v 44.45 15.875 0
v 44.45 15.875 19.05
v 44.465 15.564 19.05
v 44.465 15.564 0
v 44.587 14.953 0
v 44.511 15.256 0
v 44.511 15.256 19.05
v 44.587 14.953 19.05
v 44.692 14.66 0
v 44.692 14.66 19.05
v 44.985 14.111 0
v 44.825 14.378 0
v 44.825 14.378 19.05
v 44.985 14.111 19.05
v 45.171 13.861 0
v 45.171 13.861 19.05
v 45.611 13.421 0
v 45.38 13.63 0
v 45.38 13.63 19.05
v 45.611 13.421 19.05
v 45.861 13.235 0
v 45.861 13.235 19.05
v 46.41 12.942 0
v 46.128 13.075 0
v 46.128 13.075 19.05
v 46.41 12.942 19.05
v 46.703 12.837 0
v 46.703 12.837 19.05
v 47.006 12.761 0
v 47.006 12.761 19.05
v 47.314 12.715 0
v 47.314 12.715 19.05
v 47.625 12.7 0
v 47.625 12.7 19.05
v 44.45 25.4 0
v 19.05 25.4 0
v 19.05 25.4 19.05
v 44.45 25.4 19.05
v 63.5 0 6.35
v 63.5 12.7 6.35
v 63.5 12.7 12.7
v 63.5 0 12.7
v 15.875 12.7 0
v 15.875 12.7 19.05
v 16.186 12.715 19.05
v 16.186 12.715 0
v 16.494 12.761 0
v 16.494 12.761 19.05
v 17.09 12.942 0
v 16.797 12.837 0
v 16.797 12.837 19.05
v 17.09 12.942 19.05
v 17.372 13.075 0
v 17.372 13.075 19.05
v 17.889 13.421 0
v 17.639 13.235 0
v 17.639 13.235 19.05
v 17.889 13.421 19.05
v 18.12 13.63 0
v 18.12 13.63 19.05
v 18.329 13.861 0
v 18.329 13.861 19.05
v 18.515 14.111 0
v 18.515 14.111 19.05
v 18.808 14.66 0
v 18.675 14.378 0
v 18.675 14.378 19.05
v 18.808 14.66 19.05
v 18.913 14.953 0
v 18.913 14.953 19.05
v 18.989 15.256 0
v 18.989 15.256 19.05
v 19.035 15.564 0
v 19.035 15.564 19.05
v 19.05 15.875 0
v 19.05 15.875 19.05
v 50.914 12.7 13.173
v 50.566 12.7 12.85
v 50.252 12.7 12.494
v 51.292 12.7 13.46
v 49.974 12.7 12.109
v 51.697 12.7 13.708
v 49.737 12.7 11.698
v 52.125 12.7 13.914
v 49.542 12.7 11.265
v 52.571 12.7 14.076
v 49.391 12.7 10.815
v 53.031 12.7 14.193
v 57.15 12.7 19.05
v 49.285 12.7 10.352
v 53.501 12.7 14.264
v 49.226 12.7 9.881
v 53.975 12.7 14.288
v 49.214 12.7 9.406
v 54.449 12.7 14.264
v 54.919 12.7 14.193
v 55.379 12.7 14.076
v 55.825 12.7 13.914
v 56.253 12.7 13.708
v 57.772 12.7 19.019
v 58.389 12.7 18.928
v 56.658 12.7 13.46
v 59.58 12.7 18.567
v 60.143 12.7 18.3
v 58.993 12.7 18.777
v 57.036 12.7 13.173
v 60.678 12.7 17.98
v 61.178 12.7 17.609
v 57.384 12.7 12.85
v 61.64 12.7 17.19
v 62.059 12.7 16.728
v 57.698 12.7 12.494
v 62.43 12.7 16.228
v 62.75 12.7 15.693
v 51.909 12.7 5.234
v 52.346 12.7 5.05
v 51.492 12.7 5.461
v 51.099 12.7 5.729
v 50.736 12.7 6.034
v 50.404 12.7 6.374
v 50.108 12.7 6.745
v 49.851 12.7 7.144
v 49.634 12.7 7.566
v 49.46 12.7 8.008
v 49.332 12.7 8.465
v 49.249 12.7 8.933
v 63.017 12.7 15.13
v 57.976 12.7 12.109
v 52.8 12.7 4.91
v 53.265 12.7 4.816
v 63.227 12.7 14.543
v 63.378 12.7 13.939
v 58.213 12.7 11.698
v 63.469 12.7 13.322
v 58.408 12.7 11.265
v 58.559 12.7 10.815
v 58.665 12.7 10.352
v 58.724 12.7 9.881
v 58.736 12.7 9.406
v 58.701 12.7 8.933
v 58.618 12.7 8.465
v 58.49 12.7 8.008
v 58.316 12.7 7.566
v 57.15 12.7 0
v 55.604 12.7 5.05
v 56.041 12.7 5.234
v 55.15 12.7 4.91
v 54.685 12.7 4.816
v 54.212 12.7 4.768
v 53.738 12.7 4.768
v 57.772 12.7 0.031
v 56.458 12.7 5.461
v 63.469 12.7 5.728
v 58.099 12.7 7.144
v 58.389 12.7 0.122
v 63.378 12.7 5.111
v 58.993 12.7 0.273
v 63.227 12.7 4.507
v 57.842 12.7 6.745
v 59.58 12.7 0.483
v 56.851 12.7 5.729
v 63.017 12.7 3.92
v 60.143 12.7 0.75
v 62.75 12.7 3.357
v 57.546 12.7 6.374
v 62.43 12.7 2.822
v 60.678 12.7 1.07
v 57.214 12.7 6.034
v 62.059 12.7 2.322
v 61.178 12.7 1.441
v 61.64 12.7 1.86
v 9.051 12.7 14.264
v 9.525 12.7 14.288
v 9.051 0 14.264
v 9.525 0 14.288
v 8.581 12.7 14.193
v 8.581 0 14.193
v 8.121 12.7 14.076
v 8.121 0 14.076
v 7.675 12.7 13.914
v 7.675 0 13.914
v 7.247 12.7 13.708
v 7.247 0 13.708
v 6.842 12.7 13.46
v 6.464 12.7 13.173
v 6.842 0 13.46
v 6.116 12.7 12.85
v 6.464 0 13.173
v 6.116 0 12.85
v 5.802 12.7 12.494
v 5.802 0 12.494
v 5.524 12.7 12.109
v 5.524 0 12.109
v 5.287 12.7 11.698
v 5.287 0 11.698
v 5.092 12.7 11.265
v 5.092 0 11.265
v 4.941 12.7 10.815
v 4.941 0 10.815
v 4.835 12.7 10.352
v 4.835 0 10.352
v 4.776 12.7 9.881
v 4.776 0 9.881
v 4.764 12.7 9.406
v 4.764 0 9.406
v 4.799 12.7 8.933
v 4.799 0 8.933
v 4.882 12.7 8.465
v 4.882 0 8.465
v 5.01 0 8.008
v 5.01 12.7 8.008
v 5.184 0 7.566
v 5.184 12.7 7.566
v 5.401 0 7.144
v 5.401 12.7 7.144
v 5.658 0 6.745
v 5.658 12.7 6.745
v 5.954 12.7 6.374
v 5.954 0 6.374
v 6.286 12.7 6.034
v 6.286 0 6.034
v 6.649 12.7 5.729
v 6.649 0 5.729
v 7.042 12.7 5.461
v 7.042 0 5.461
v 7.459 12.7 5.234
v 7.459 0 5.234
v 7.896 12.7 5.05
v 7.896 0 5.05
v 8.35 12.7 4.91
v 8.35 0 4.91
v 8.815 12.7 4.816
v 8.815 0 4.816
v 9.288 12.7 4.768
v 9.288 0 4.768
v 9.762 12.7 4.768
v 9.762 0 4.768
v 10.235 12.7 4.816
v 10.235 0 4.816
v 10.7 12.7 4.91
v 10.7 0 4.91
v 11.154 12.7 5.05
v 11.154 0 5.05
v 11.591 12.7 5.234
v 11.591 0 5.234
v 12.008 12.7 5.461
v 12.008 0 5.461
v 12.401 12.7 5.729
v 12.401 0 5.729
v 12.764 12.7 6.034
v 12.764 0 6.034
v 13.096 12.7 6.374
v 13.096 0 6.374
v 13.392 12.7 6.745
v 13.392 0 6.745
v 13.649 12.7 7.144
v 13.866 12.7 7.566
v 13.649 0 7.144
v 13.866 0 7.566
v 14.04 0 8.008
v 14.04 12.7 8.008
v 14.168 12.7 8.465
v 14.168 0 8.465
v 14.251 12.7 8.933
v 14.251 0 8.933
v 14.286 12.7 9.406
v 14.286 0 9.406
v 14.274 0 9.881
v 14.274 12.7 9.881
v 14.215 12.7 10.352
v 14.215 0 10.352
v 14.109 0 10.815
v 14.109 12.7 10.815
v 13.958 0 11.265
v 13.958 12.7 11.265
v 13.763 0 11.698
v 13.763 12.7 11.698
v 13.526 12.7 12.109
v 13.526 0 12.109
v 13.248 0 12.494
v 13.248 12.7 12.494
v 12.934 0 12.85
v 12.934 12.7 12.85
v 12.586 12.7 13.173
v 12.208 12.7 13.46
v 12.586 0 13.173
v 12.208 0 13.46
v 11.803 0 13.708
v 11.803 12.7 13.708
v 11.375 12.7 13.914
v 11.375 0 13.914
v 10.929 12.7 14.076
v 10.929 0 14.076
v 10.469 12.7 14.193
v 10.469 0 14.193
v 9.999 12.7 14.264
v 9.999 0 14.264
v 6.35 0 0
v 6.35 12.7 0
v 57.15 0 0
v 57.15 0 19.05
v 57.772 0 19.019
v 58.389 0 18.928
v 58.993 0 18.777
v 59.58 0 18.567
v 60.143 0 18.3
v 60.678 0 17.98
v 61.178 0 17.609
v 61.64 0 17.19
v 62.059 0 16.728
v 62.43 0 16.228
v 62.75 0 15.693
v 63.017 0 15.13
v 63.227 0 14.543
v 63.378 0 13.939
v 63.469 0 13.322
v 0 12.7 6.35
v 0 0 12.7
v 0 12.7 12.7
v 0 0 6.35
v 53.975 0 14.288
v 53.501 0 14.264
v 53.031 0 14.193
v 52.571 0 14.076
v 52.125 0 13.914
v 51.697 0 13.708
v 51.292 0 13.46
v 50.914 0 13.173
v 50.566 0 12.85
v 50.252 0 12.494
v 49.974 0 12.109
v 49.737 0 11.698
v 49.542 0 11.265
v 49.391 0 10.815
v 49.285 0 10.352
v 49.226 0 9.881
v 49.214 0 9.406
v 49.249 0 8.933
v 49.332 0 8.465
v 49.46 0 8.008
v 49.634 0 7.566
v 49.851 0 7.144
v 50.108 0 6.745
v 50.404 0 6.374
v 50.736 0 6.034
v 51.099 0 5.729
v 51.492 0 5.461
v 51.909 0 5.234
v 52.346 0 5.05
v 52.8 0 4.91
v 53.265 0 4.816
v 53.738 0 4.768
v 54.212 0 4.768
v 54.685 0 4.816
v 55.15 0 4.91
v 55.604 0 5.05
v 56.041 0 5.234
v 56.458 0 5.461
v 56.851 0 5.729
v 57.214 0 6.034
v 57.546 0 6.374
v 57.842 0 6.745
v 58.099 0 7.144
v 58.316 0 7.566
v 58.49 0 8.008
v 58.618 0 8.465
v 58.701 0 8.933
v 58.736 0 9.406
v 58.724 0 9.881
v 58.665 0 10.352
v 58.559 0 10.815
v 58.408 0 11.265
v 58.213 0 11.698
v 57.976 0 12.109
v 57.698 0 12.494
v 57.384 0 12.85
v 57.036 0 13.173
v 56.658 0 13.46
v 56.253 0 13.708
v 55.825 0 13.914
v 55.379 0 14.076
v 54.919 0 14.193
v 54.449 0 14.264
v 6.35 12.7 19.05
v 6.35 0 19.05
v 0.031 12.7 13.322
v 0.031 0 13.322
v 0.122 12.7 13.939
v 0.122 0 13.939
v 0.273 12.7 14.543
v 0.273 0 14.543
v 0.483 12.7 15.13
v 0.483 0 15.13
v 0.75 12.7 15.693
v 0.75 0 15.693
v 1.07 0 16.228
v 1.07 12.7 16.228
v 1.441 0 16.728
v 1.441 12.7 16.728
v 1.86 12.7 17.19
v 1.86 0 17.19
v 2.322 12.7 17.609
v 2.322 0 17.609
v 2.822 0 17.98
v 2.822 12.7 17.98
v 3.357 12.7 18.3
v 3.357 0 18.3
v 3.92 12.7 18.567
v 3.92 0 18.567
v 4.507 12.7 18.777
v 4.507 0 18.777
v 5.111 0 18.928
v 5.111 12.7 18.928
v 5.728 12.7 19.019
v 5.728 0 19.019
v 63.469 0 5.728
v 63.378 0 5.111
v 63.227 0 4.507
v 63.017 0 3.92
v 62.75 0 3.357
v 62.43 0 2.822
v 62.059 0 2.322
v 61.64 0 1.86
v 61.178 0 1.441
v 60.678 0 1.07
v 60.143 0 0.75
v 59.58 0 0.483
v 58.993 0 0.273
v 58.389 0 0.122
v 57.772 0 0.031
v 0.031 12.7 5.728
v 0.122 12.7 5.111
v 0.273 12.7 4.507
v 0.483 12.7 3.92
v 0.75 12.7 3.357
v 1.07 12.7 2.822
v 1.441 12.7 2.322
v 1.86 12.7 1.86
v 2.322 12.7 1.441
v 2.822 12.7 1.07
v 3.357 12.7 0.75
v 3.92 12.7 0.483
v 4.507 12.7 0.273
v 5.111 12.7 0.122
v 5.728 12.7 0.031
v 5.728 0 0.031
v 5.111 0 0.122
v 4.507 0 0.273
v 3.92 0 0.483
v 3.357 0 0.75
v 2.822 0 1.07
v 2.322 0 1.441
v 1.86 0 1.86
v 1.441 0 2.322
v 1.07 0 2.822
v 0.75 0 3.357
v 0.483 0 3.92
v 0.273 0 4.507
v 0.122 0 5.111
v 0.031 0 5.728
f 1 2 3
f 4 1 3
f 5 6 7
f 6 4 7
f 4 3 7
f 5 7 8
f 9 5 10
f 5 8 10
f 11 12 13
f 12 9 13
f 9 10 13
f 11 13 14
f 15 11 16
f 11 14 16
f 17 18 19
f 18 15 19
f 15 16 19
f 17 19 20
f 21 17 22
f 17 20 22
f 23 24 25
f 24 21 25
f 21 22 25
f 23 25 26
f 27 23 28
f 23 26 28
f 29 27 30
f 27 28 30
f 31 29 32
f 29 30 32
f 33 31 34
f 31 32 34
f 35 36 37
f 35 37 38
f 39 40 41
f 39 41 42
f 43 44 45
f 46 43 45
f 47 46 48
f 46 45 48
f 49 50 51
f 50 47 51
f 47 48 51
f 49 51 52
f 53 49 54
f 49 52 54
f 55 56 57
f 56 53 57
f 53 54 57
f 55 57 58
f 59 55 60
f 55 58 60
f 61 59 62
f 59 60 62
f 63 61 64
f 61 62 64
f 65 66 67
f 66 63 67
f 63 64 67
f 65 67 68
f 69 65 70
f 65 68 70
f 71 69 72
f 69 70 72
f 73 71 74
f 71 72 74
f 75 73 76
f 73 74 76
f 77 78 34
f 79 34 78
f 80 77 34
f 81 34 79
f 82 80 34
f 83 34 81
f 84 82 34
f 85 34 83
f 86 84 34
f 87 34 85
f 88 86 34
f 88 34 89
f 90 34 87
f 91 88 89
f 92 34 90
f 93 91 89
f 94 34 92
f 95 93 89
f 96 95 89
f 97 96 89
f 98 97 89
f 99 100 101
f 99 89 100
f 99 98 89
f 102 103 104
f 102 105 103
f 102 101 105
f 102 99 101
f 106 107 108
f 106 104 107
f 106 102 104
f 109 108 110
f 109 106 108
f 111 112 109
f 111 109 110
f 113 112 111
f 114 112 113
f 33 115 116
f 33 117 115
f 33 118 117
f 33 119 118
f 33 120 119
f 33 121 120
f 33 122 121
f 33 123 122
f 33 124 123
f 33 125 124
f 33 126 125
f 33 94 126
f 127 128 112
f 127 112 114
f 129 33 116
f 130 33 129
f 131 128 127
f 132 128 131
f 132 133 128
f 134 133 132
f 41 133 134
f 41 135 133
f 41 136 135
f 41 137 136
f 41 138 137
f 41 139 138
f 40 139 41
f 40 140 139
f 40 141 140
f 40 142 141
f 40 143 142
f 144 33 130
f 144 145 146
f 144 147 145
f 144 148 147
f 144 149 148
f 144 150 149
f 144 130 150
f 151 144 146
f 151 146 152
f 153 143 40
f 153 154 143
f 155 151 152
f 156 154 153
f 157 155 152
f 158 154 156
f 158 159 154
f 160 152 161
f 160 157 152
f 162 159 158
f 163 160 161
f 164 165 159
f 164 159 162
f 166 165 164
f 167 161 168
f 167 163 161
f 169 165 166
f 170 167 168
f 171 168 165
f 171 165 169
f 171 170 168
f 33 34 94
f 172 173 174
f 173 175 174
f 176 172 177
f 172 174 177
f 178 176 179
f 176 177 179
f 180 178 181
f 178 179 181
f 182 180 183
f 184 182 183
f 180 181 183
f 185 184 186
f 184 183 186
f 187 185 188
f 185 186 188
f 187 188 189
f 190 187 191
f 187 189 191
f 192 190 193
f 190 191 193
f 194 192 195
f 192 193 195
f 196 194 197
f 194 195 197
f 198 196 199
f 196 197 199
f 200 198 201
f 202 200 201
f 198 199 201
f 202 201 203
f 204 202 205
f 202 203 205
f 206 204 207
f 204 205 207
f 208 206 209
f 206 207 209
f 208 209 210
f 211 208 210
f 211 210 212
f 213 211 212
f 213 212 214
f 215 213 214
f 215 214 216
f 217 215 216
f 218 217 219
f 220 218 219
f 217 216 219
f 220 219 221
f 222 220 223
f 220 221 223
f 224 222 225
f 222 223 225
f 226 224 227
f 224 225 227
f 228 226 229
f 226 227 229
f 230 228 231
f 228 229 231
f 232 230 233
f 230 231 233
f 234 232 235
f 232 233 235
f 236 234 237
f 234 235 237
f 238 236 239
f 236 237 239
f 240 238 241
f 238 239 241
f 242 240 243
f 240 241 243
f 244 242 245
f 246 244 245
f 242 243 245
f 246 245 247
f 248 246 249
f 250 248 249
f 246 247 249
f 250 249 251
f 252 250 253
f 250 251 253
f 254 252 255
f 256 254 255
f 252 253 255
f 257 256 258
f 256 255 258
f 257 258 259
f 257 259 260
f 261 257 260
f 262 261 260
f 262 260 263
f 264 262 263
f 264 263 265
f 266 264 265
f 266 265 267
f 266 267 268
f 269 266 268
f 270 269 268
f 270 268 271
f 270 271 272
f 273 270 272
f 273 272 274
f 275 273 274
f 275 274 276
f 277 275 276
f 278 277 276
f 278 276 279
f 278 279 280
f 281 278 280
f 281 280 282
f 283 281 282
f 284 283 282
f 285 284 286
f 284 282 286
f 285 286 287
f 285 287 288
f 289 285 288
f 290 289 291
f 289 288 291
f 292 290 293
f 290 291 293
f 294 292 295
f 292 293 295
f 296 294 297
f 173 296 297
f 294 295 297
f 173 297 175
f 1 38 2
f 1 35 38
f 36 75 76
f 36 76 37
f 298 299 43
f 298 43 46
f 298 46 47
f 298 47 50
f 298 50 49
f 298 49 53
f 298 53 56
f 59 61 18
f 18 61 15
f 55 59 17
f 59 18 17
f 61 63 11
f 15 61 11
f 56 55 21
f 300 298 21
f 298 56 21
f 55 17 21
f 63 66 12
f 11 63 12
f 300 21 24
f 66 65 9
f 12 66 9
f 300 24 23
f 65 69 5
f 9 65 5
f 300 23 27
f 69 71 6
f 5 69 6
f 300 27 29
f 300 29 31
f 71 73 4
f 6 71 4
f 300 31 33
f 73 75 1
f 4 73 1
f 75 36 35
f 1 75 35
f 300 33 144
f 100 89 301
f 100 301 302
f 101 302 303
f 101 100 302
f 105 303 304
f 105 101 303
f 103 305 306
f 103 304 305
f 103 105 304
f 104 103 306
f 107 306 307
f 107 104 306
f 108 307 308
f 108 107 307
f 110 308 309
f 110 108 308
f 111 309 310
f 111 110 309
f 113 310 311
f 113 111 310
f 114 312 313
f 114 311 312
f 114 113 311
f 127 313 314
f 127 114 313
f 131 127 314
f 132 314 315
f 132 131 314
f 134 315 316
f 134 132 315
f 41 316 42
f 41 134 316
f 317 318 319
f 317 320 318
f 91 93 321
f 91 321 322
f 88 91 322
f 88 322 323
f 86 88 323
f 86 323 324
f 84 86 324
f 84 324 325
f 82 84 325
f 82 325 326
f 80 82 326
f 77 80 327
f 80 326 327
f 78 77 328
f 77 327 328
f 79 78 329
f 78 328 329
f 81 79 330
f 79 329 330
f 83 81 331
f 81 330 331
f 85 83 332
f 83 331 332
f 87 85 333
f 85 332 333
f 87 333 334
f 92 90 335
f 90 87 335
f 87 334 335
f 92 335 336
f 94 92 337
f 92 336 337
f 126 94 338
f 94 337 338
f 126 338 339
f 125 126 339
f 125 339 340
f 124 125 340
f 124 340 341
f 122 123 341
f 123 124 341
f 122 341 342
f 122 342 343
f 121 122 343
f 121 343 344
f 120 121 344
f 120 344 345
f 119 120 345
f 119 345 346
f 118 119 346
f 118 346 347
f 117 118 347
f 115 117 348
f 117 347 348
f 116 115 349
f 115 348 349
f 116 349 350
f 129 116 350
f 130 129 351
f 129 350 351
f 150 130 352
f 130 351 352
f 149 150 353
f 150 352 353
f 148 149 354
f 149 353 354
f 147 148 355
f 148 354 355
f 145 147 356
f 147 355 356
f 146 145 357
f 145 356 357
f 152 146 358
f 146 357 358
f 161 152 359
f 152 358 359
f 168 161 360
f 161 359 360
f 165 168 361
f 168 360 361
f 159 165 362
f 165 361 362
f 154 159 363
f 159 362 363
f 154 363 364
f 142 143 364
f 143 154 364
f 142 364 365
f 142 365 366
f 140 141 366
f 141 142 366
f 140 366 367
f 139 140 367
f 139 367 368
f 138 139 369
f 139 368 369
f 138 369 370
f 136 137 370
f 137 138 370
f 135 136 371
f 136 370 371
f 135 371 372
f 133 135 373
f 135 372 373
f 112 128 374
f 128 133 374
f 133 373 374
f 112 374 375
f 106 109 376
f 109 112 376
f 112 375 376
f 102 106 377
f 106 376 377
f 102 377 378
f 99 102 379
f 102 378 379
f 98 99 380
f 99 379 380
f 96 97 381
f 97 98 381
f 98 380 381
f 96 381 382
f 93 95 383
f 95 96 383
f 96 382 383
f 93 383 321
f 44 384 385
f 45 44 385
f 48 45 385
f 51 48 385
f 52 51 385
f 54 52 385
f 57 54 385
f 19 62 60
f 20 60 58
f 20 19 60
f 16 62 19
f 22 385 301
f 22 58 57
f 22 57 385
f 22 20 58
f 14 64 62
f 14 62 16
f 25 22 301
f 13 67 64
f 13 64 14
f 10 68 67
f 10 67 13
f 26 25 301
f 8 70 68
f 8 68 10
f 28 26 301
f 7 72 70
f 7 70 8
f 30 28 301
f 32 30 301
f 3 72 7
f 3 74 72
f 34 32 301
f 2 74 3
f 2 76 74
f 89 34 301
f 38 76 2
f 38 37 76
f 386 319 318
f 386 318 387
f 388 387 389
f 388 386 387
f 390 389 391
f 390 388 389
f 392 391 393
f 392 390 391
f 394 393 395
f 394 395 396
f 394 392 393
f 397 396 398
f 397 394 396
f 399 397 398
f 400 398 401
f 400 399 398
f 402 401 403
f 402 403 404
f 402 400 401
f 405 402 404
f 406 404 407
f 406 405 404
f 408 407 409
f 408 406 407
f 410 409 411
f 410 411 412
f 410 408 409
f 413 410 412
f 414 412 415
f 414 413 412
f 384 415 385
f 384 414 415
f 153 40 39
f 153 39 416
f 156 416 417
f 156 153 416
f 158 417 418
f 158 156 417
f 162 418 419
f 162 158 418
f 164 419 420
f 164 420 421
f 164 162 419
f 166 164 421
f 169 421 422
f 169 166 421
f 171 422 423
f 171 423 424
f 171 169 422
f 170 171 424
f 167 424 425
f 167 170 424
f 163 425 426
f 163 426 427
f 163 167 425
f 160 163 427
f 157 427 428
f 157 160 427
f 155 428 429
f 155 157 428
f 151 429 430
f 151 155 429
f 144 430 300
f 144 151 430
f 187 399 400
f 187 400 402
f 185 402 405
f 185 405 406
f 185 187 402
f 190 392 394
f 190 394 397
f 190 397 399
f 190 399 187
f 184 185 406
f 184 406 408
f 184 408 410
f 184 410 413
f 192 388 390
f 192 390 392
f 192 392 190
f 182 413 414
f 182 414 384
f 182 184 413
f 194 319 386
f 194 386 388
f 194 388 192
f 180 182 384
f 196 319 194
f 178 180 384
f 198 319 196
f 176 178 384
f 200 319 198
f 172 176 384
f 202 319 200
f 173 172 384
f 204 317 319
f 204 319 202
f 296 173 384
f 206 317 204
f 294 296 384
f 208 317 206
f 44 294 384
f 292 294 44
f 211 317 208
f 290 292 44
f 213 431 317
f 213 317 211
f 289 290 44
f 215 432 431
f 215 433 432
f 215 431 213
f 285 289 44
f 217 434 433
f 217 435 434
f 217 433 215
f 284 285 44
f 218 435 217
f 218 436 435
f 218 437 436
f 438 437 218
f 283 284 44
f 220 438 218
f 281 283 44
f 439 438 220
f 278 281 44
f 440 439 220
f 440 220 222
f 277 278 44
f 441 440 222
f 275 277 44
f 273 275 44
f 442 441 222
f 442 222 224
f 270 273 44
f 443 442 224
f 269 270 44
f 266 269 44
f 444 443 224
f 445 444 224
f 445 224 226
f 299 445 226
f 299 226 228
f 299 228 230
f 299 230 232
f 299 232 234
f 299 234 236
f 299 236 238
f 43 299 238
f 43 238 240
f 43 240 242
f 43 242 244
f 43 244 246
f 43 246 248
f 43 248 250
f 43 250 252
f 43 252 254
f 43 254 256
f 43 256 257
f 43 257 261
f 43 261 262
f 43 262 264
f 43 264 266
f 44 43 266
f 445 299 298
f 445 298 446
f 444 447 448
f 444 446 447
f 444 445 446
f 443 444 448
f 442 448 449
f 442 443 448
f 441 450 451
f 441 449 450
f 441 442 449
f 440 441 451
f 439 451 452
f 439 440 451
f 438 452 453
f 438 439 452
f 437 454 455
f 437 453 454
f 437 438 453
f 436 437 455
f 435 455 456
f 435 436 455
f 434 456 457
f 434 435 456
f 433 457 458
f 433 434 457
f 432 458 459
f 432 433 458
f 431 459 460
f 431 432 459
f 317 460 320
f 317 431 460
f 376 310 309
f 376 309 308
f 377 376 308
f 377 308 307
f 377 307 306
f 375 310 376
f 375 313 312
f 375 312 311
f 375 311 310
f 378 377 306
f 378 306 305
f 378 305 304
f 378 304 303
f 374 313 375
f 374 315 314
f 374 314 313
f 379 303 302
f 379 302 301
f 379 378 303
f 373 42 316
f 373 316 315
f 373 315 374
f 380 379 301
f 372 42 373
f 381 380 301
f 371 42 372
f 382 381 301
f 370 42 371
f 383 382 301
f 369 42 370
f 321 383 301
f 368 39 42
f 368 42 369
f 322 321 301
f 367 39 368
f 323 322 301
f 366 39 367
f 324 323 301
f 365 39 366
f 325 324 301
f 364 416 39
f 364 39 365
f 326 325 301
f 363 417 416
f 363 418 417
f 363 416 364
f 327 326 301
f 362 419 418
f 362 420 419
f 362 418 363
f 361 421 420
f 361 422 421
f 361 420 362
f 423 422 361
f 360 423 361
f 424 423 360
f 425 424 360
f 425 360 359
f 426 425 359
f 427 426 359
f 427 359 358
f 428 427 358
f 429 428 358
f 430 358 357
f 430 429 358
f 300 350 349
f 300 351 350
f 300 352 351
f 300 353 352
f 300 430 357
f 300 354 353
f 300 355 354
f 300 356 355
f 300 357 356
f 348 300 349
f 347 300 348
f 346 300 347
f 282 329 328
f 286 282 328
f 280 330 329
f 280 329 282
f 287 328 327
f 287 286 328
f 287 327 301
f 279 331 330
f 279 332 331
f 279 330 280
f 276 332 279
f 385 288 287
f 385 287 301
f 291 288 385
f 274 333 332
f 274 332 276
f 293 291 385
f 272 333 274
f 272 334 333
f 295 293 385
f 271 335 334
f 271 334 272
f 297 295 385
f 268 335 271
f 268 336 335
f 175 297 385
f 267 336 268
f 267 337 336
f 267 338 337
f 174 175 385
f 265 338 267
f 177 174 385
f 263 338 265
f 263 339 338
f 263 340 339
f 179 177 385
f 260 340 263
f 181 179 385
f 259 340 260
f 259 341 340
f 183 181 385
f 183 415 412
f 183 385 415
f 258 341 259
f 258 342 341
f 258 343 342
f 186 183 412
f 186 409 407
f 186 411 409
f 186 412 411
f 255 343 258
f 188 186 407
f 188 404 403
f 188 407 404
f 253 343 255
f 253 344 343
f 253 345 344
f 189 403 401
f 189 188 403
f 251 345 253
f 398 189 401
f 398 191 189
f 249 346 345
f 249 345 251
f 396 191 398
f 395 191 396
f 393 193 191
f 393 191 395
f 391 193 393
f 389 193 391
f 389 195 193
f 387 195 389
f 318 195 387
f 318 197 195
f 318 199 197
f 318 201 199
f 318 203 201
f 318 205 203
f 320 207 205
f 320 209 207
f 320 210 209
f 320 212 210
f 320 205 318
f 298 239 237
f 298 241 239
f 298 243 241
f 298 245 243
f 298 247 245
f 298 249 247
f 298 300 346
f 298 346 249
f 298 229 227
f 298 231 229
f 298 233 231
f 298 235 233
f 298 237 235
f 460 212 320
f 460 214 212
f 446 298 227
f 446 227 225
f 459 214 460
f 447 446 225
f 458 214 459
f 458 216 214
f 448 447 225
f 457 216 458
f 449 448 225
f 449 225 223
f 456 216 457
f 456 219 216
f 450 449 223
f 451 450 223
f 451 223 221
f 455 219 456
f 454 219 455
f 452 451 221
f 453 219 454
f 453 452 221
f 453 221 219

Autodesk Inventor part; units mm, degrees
ref_plane "YZ Plane" through (0, 0, 0) normal (1, 0, 0) x (0, 1, 0)
ref_plane "XZ Plane" through (0, 0, 0) normal (0, 1, 0) x (-1, 0, 0)
ref_plane "XY Plane" through (0, 0, 0) normal (0, 0, 1) x (1, 0, 0)
sketch "Sketch1" plane through (0, 0, 0) normal (0, 0, 1) x (1, 0, 0)
  line L0 (0, 0) -> (0, 12.7)
  line L1 (0, 12.7) -> (19.05, 12.7)
  line L2 (19.05, 12.7) -> (19.05, 25.4)
  line L3 (19.05, 25.4) -> (31.75, 25.4)
  line L4 (31.75, 25.4) -> (31.75, 0)
  line L5 (31.75, 0) -> (0, 0)
  dimension "d0" = 12.7
  dimension "d1" = 31.75
  dimension "d2" = 19.05
  dimension "d3" = 12.7
extrude "Extrusion1" add sketch "Sketch1" along normal blind 19.05
sketch "Sketch2" plane through (0, 12.7, 0) normal (0, 1, 0) x (1, 0, 0)
  line L0 (0, 0) -> (0, -19.05) projected
  line L1 (0, 0) -> (19.05, 0) projected
  point P0 (9.525, -9.525)
  dimension "d6" = 9.525
  dimension "d7" = 9.525
hole "Hole1" at (9.525, 12.7, 9.525) direction (0, -1, 0) diameter 9.525 end through all
fillet "Fillet1" radius 6.35 1 edges at (0, 6.35, 19.05)
fillet "Fillet2" radius 6.35 1 edges at (0, 6.35, 0)
mirror "Mirror1" about plane through (31.75, 0, 0) normal (1, 0, 0) of "Extrusion1", "Hole1", "Fillet1", "Fillet2"
fillet "Fillet3" radius 3.175 1 edges at (44.45, 12.7, 9.525)
fillet "Fillet4" radius 3.175 1 edges at (19.05, 12.7, 9.525)
properties part number "Mirror"
